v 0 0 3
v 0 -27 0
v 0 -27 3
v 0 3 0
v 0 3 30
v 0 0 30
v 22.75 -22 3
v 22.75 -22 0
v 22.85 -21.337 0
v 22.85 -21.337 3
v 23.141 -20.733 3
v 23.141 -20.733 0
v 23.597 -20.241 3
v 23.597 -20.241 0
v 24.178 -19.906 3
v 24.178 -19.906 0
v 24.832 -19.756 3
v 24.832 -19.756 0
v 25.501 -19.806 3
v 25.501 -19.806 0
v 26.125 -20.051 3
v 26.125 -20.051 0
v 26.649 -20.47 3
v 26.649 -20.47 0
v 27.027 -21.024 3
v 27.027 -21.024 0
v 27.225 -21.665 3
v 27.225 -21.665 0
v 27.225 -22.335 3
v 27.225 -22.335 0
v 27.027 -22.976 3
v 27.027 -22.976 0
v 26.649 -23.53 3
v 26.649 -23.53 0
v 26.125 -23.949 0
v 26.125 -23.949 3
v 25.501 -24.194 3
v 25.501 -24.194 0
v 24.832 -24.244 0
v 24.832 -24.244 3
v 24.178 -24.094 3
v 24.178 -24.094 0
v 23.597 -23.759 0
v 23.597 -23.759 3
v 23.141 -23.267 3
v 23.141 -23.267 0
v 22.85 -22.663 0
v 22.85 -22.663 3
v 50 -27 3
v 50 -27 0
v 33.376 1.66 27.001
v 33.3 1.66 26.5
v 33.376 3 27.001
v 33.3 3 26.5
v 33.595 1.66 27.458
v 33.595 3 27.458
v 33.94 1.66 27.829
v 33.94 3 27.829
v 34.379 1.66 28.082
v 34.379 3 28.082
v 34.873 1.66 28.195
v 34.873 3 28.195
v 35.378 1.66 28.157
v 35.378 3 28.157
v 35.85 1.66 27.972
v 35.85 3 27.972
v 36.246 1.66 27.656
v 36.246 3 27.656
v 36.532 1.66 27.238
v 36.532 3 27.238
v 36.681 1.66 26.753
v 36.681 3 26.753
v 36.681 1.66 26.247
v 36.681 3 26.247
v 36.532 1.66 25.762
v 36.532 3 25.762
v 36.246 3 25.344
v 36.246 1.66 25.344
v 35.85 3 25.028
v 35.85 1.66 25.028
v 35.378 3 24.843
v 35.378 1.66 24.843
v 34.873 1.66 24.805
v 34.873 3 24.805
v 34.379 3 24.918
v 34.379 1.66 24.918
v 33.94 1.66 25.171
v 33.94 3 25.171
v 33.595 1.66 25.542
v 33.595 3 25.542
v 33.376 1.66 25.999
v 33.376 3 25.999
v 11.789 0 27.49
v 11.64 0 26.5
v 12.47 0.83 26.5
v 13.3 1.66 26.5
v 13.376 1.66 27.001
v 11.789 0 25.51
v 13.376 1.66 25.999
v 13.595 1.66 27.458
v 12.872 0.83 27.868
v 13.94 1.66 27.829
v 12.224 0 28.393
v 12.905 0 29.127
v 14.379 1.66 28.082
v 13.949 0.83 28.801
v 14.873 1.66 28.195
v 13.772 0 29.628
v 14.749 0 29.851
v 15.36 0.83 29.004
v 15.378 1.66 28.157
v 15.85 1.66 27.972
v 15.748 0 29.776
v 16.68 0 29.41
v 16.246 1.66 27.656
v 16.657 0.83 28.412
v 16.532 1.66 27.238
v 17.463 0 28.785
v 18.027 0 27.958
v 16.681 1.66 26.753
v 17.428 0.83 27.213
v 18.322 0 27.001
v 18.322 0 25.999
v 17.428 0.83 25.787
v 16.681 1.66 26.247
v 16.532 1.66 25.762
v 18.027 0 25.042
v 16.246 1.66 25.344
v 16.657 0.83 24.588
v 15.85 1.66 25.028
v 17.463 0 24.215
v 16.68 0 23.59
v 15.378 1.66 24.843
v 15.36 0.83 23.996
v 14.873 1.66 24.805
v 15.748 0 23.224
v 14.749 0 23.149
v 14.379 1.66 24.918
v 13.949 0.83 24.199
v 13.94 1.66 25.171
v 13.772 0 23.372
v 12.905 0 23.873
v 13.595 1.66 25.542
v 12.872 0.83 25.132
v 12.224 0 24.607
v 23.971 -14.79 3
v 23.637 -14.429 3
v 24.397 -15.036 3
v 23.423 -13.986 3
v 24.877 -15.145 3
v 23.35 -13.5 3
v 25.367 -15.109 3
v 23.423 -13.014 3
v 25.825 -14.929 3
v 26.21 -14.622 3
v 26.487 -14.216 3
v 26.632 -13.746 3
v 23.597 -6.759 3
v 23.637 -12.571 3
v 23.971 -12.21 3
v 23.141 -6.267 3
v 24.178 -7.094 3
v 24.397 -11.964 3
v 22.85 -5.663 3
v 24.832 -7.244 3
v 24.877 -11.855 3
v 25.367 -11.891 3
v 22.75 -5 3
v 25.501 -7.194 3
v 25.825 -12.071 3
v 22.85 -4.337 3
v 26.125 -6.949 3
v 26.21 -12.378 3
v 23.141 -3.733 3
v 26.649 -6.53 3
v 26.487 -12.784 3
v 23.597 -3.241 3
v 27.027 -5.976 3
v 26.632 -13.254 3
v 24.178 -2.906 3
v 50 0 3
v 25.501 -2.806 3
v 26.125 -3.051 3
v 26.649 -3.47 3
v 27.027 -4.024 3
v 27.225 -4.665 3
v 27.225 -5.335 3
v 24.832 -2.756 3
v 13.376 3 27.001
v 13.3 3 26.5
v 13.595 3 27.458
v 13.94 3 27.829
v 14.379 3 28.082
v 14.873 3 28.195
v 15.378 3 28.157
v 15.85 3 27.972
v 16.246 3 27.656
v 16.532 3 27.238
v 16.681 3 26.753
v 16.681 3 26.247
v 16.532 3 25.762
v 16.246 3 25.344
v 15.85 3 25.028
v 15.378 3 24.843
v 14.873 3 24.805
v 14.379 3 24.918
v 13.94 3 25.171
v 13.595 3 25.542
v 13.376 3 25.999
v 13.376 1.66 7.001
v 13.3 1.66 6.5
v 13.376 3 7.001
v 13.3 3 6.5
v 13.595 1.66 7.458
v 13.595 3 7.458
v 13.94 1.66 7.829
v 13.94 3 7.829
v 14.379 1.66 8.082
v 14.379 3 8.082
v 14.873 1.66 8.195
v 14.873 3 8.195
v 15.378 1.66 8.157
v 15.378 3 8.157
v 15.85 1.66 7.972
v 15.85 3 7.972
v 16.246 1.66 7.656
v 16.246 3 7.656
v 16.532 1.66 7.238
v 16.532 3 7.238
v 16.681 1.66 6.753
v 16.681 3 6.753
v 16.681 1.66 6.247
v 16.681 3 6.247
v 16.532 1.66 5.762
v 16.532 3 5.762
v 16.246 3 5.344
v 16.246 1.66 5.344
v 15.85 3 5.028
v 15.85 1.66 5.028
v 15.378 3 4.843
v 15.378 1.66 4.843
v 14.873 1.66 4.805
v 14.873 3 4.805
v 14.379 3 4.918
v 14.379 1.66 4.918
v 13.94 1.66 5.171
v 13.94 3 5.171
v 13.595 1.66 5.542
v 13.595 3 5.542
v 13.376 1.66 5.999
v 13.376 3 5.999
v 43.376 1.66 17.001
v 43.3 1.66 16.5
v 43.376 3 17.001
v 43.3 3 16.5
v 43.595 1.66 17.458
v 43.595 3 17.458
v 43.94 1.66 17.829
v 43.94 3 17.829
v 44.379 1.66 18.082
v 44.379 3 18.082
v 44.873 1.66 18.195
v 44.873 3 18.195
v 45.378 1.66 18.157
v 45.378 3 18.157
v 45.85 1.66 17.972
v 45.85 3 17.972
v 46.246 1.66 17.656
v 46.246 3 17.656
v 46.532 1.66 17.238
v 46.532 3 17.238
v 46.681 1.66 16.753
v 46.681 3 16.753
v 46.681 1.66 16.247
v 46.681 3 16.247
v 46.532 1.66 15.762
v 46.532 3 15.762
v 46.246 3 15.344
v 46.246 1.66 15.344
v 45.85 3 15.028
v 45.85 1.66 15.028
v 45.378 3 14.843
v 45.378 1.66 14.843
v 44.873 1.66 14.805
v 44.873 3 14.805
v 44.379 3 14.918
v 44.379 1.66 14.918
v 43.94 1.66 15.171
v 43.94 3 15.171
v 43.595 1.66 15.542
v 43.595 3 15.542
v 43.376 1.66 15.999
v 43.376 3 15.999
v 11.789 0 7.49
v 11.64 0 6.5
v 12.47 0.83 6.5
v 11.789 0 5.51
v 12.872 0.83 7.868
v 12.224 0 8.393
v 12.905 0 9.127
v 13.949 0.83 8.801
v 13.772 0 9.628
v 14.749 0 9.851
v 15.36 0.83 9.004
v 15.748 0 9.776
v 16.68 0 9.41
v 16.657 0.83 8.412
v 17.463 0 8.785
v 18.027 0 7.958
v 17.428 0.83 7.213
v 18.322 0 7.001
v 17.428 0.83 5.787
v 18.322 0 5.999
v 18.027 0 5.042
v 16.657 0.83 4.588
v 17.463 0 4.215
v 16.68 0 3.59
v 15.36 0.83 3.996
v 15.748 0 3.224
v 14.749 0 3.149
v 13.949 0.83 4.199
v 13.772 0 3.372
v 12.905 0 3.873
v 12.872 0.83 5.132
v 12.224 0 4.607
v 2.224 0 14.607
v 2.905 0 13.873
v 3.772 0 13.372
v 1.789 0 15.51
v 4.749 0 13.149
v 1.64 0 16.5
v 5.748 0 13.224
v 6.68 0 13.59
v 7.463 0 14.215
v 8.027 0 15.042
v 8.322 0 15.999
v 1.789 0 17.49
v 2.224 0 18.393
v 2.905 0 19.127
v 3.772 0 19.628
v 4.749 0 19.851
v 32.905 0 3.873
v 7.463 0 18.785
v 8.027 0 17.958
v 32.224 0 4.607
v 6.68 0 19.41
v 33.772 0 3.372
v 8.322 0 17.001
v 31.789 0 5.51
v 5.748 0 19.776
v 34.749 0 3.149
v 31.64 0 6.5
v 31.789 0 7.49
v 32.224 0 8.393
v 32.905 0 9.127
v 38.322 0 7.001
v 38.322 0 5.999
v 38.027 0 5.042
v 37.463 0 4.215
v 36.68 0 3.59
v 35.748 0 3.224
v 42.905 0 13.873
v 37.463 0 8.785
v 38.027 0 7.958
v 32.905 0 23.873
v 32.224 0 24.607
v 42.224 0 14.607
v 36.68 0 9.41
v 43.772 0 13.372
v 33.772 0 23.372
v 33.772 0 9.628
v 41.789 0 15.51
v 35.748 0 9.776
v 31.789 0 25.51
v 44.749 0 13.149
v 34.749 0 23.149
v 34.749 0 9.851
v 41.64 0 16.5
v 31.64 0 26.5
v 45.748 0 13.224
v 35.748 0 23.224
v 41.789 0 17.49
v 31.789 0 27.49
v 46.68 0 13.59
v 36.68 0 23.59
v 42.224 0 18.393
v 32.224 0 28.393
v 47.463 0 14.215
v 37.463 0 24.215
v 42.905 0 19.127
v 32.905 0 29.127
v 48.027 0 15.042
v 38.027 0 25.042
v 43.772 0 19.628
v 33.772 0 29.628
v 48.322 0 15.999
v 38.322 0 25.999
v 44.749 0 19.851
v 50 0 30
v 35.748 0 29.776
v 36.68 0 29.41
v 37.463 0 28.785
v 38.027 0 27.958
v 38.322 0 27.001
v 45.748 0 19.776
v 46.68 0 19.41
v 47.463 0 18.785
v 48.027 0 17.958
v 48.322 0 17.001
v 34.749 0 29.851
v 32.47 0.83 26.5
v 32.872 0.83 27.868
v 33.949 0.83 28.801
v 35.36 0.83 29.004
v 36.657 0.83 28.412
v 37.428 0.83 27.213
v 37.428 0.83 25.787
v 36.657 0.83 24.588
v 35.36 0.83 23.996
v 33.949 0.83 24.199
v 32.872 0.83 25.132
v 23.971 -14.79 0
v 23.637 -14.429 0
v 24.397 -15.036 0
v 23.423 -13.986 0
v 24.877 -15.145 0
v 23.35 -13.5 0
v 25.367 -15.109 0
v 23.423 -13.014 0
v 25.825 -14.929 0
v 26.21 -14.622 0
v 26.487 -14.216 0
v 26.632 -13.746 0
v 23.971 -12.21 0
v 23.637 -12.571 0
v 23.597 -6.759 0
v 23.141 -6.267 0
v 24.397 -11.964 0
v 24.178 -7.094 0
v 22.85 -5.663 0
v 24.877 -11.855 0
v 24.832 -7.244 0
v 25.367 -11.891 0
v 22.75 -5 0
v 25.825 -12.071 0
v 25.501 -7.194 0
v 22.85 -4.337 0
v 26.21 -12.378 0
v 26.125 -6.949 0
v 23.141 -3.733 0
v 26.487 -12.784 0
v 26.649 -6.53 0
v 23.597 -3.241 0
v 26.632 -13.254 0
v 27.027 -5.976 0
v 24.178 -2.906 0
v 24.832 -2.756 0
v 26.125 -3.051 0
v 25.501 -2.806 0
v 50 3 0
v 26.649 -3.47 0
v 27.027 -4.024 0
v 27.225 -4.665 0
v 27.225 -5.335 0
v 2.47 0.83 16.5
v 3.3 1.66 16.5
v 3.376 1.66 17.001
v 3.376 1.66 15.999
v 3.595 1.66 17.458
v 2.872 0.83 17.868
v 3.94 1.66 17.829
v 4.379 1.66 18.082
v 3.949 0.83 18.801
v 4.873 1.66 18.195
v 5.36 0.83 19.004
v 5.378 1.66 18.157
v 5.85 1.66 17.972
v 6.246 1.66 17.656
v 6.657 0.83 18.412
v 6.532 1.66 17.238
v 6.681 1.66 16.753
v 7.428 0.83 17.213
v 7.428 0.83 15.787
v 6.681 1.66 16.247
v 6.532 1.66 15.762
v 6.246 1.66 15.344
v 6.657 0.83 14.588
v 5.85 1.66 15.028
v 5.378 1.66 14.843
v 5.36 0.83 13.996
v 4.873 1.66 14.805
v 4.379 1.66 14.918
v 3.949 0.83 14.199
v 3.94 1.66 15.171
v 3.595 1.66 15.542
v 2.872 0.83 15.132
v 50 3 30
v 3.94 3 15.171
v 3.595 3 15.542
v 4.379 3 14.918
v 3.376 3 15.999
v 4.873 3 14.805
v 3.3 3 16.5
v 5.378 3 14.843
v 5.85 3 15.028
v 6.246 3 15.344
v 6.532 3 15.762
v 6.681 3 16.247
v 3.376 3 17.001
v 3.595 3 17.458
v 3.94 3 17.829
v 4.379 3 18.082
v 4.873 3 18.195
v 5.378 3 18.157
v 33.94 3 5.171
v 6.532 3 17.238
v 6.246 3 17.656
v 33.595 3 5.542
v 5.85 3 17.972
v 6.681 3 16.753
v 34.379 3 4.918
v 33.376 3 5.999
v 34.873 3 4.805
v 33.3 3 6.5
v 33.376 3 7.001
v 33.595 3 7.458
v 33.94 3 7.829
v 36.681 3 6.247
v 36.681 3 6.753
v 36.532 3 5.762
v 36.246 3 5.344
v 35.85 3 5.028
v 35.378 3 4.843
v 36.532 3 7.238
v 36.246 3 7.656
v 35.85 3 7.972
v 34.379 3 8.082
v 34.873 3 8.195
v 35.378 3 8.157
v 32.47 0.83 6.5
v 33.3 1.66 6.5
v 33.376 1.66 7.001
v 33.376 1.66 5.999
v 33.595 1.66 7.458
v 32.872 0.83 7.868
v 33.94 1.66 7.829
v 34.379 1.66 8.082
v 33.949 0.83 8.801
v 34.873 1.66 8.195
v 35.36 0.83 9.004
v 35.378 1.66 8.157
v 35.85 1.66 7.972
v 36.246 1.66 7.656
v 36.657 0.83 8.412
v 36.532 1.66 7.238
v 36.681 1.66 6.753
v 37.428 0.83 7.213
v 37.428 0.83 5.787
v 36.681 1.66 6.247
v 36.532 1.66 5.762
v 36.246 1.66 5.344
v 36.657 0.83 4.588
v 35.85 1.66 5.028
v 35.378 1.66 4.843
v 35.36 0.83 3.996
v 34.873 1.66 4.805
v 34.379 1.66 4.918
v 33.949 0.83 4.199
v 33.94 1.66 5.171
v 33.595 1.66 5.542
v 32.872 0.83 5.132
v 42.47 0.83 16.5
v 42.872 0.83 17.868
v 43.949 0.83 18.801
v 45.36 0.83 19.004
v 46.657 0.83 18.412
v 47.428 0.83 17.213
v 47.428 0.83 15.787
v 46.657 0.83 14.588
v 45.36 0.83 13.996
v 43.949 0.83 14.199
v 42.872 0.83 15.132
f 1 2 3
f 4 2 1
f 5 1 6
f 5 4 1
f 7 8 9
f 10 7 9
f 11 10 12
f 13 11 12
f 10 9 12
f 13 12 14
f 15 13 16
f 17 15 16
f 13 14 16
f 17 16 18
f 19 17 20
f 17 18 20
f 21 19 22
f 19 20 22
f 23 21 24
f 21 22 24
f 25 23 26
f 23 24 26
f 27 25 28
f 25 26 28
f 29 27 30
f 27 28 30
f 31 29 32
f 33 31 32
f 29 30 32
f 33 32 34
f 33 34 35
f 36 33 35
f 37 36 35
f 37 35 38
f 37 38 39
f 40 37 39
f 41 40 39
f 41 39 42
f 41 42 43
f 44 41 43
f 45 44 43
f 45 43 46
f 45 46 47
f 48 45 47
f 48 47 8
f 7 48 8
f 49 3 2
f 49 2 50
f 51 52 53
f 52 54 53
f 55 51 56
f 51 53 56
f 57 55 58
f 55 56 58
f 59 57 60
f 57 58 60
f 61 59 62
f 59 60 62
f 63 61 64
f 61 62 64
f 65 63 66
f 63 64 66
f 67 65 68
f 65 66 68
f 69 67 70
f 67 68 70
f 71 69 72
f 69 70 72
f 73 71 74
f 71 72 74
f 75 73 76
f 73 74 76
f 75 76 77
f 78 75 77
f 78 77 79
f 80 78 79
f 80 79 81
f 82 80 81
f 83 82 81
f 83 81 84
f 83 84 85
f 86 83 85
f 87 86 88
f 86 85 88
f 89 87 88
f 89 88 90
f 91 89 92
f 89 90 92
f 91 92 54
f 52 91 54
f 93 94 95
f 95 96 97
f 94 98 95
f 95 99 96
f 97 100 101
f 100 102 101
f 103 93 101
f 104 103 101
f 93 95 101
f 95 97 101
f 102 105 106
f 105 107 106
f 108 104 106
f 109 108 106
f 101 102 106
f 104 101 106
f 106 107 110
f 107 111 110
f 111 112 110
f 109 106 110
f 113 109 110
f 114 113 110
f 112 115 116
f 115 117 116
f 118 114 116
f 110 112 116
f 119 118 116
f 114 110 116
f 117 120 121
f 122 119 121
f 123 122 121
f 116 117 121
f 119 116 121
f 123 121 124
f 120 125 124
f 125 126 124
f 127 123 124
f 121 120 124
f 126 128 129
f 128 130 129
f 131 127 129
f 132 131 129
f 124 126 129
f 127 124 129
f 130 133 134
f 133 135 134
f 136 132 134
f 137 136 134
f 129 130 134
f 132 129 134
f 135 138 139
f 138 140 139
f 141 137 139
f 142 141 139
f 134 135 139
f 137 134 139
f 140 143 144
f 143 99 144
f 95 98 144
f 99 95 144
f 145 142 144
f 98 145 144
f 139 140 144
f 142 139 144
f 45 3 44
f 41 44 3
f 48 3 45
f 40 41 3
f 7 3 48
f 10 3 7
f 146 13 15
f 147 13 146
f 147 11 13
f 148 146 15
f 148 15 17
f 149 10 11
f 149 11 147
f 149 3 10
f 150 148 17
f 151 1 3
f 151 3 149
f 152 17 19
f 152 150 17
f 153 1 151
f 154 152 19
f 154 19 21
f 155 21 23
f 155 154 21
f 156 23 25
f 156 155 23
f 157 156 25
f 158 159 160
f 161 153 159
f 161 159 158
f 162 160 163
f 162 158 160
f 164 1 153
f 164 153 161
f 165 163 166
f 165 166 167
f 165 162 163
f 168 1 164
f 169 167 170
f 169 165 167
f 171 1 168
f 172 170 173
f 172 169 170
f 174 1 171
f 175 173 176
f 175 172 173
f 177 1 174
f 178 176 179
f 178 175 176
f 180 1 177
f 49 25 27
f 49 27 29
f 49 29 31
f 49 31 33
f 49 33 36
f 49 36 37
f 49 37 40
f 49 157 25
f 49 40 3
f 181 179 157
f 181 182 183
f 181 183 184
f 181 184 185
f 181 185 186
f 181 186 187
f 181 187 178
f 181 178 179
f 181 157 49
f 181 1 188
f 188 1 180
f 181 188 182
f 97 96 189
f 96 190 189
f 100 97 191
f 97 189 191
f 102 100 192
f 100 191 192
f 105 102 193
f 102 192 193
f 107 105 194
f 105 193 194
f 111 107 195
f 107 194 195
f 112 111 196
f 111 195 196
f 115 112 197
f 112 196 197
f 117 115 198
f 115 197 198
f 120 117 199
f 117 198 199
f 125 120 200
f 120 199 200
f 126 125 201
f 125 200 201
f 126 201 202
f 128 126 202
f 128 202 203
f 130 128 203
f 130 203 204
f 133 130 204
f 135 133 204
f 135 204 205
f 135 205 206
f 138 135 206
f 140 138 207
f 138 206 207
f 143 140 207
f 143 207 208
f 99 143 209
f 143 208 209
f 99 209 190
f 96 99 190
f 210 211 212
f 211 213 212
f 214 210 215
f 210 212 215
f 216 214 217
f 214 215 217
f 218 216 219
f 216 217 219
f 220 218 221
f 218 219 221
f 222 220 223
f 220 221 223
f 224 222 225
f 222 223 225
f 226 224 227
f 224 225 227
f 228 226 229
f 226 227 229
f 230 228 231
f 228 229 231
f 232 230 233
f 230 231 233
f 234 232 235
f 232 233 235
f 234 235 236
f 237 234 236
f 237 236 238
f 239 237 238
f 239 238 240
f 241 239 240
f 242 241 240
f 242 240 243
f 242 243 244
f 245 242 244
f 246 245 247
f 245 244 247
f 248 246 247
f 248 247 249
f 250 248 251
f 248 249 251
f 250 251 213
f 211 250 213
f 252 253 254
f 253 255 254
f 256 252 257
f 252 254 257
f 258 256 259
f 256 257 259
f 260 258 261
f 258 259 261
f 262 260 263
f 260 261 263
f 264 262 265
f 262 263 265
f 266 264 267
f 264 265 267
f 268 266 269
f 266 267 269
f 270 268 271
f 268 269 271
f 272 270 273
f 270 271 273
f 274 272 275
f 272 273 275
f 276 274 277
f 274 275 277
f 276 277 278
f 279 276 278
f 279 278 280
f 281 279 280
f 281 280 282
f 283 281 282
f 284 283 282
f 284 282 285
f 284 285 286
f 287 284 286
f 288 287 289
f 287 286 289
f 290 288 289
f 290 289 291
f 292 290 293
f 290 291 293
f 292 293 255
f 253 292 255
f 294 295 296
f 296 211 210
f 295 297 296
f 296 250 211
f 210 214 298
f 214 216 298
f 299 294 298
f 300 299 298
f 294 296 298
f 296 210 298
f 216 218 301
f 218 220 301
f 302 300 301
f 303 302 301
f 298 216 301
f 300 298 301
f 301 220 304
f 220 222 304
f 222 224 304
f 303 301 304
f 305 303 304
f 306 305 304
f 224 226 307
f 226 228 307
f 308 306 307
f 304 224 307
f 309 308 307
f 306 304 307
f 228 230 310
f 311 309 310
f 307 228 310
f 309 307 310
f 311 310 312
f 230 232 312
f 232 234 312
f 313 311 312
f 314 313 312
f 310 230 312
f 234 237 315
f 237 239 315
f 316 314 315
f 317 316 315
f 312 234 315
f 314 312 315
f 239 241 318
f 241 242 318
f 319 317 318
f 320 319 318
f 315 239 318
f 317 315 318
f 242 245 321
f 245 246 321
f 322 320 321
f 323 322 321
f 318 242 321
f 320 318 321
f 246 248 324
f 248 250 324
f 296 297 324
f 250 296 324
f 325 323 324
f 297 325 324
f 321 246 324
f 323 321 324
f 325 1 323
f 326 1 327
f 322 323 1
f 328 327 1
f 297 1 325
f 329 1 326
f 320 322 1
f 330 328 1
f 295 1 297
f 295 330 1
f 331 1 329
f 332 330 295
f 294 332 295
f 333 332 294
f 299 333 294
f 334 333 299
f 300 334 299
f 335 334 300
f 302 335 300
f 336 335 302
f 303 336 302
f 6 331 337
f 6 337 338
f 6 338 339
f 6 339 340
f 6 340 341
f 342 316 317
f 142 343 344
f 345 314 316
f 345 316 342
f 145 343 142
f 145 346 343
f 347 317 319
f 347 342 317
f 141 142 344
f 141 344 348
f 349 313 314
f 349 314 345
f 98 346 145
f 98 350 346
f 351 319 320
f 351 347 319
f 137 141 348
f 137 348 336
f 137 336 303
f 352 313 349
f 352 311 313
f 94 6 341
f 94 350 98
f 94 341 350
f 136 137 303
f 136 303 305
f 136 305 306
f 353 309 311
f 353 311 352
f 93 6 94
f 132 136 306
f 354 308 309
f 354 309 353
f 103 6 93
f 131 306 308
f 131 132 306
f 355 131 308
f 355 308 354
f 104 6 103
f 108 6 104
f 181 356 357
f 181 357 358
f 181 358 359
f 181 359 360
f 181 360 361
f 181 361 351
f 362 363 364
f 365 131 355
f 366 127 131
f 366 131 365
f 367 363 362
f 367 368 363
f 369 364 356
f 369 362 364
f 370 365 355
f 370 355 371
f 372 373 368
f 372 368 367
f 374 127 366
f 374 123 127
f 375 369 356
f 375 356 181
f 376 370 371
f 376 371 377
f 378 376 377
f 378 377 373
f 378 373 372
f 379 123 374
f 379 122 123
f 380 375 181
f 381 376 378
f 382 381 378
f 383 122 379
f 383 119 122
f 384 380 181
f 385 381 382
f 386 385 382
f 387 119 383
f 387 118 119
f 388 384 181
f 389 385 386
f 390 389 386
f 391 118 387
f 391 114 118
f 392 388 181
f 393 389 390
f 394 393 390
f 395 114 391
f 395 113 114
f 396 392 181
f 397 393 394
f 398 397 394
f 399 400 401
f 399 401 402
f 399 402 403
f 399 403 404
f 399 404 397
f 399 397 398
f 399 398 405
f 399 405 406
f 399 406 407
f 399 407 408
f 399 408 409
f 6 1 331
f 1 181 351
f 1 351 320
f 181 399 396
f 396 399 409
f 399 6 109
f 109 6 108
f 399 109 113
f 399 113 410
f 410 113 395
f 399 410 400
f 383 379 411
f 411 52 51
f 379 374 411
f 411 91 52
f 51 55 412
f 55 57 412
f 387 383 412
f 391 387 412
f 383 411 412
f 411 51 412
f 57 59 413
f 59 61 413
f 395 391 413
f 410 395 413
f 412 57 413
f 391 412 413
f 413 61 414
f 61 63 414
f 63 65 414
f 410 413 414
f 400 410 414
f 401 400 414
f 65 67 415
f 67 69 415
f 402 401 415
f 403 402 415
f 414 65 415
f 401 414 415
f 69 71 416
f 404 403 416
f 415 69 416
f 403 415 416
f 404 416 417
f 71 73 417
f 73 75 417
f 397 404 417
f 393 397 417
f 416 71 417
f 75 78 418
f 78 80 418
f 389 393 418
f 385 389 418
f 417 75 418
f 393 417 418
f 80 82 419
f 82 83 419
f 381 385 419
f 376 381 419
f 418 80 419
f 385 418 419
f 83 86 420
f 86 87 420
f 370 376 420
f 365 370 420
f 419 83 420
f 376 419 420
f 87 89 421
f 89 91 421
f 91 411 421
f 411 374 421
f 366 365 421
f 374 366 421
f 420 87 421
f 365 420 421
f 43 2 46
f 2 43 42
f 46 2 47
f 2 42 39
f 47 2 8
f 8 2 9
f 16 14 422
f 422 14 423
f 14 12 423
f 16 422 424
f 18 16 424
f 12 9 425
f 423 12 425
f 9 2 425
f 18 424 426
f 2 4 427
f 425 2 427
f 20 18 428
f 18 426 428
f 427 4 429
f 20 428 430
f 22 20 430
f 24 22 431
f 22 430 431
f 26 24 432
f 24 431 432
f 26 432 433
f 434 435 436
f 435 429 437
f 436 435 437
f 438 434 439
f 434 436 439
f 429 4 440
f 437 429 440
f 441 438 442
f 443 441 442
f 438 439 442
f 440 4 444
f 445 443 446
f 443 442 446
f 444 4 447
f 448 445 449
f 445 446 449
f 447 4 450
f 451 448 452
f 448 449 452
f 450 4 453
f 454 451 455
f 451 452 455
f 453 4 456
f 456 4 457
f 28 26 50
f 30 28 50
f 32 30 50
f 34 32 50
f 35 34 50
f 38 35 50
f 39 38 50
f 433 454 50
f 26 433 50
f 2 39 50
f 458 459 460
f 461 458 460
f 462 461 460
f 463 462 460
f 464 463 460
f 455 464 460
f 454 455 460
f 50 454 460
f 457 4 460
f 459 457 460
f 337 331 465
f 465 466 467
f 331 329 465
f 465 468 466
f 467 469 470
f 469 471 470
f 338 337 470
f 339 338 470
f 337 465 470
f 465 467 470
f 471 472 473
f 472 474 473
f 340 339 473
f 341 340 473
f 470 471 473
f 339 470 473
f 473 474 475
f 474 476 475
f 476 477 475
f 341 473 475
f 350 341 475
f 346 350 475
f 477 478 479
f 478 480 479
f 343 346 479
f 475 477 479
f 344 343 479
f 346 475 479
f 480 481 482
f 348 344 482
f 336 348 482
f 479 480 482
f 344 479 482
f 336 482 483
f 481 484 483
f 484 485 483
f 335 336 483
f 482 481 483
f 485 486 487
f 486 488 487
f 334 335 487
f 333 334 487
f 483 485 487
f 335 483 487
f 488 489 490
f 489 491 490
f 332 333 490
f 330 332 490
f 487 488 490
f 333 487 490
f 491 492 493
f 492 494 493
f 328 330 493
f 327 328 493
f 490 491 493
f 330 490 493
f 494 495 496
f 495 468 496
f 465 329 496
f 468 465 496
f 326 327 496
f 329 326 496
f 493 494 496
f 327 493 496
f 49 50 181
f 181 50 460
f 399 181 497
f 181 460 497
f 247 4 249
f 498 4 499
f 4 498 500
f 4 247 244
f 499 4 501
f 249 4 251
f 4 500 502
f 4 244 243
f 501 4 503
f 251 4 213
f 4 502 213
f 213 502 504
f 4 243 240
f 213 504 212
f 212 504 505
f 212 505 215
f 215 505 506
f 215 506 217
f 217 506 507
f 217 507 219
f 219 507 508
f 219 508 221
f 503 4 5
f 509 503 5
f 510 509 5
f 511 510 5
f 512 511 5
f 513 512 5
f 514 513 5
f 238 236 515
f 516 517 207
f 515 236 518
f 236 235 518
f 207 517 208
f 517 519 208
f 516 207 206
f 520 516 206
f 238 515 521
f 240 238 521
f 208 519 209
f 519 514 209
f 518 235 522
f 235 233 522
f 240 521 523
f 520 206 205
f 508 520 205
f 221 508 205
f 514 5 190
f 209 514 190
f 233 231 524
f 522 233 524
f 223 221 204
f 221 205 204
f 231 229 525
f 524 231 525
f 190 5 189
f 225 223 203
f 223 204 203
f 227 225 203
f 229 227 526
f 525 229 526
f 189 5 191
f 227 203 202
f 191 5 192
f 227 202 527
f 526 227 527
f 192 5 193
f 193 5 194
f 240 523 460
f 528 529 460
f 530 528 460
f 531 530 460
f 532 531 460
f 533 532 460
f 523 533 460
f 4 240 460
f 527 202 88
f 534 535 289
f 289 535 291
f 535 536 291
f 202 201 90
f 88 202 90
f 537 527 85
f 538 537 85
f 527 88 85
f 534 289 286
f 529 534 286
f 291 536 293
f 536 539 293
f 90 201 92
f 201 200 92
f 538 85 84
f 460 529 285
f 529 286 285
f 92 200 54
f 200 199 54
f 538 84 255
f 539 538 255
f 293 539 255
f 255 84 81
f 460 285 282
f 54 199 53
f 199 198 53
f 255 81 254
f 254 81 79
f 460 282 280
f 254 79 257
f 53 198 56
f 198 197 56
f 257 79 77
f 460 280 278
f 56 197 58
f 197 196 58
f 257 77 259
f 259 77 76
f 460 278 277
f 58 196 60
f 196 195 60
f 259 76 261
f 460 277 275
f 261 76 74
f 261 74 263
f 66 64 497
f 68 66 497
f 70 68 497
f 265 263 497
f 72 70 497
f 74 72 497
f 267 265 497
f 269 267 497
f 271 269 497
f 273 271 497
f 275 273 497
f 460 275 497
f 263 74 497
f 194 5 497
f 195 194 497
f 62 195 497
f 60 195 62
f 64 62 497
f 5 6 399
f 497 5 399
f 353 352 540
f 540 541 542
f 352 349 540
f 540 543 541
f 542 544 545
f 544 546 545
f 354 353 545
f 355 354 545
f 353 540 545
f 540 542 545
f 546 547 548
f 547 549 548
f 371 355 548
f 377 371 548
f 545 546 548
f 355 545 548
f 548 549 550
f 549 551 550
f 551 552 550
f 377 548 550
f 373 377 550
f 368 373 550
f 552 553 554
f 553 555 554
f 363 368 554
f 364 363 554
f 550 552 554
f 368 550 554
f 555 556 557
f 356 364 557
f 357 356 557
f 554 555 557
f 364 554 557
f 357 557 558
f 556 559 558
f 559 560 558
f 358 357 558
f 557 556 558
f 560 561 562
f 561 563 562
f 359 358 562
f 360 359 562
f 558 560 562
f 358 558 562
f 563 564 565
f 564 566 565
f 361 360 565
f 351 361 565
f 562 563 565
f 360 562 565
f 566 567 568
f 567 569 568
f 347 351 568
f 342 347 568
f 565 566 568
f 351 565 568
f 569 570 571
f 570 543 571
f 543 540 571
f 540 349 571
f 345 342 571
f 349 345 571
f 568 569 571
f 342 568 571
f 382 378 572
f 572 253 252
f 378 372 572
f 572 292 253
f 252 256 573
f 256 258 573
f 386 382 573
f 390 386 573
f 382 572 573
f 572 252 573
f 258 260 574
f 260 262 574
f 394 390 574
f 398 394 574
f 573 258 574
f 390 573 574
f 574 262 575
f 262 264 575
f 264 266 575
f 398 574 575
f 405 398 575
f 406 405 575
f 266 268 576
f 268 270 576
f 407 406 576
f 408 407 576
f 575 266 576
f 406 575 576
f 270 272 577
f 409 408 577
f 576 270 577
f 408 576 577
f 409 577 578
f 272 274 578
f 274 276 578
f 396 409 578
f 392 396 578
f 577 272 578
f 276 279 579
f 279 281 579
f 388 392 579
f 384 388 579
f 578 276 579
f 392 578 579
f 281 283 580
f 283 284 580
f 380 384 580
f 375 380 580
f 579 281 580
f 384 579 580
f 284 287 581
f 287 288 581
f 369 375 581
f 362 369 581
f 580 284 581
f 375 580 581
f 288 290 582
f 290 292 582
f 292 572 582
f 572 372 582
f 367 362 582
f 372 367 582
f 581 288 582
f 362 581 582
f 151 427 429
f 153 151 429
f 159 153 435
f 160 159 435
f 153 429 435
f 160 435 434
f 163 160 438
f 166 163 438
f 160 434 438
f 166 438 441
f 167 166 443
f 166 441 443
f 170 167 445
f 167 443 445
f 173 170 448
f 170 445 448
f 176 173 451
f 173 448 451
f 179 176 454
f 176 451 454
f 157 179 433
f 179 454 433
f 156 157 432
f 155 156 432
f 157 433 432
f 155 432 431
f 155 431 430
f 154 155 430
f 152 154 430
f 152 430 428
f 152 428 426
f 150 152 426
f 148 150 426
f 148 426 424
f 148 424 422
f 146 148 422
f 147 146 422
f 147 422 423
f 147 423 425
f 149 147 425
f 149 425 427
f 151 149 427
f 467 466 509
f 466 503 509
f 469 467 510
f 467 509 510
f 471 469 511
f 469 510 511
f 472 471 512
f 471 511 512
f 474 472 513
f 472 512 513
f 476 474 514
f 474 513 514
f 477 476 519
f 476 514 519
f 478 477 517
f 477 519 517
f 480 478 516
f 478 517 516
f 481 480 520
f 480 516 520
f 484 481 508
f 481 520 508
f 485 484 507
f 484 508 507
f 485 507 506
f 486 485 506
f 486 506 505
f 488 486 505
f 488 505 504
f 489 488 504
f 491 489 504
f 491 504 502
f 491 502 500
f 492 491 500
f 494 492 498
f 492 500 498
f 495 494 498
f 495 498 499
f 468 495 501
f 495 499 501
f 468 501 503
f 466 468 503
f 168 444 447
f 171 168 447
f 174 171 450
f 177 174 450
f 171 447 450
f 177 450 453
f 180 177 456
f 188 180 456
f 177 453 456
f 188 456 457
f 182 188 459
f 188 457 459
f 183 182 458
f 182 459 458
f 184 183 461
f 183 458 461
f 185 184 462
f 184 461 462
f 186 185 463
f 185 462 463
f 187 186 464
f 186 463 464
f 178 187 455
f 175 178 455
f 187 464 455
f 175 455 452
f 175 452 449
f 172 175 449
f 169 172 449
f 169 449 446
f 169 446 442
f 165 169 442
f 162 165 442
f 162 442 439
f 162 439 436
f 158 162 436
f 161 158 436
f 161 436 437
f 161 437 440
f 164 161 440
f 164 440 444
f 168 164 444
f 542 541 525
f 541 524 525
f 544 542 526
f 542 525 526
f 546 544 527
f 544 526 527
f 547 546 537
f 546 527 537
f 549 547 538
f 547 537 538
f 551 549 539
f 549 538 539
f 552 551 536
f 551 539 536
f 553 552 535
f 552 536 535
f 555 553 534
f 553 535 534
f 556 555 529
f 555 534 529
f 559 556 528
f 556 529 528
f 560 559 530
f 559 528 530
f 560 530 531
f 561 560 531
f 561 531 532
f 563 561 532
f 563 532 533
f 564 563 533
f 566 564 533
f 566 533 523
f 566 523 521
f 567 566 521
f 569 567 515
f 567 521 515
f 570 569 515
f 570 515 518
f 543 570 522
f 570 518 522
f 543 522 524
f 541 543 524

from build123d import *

# Parameters (mm, degrees)
F0_W           = 50
F0_H           = 27
F1_DEPTH       = 3
F2_D           = 3.4
F2_CSINK_D     = 6.72
F2_CSINK_ANGLE = 90
F3_DEPTH       = 3
F0_H_2         = 3
F4_DEPTH       = 27
F6_D           = 3.3
F7_D           = 4.5


with BuildPart() as f1:
    # F0 (on Front) → F1 (new body)
    with BuildSketch(Plane.XZ):
        with Locations((25, 16.5)):
            Rectangle(F0_W, F0_H)
    extrude(amount=-F1_DEPTH)

    # F2 (through all)
    with Locations(Plane.XZ):
        with Locations((35, 26.5), (15, 26.5), (15, 6.5), (35, 6.5), (5, 16.5), (45, 16.5)):
            CounterSinkHole(F2_D / 2, F2_CSINK_D / 2, counter_sink_angle=F2_CSINK_ANGLE)

    # F3 (add): a face of the model
    f3_faces = [f1.faces().sort_by_distance(p)[0] for p in [
        (25, 1.5, 3),
    ]]
    extrude(f3_faces, amount=F3_DEPTH)

    # F0 (on Front) → F4 (join)
    with BuildSketch(Plane.XZ):
        with Locations((25, 1.5)):
            Rectangle(F0_W, F0_H_2)
    extrude(amount=F4_DEPTH)

    # F6 (through all)
    with Locations(Plane.XY.offset(3)):
        with Locations((25, -13.5)):
            Hole(F6_D / 2)

    # F7 (through all)
    with Locations(Plane.XY.offset(3)):
        with Locations((25, -5), (25, -22)):
            Hole(F7_D / 2)


solid = f1.part
